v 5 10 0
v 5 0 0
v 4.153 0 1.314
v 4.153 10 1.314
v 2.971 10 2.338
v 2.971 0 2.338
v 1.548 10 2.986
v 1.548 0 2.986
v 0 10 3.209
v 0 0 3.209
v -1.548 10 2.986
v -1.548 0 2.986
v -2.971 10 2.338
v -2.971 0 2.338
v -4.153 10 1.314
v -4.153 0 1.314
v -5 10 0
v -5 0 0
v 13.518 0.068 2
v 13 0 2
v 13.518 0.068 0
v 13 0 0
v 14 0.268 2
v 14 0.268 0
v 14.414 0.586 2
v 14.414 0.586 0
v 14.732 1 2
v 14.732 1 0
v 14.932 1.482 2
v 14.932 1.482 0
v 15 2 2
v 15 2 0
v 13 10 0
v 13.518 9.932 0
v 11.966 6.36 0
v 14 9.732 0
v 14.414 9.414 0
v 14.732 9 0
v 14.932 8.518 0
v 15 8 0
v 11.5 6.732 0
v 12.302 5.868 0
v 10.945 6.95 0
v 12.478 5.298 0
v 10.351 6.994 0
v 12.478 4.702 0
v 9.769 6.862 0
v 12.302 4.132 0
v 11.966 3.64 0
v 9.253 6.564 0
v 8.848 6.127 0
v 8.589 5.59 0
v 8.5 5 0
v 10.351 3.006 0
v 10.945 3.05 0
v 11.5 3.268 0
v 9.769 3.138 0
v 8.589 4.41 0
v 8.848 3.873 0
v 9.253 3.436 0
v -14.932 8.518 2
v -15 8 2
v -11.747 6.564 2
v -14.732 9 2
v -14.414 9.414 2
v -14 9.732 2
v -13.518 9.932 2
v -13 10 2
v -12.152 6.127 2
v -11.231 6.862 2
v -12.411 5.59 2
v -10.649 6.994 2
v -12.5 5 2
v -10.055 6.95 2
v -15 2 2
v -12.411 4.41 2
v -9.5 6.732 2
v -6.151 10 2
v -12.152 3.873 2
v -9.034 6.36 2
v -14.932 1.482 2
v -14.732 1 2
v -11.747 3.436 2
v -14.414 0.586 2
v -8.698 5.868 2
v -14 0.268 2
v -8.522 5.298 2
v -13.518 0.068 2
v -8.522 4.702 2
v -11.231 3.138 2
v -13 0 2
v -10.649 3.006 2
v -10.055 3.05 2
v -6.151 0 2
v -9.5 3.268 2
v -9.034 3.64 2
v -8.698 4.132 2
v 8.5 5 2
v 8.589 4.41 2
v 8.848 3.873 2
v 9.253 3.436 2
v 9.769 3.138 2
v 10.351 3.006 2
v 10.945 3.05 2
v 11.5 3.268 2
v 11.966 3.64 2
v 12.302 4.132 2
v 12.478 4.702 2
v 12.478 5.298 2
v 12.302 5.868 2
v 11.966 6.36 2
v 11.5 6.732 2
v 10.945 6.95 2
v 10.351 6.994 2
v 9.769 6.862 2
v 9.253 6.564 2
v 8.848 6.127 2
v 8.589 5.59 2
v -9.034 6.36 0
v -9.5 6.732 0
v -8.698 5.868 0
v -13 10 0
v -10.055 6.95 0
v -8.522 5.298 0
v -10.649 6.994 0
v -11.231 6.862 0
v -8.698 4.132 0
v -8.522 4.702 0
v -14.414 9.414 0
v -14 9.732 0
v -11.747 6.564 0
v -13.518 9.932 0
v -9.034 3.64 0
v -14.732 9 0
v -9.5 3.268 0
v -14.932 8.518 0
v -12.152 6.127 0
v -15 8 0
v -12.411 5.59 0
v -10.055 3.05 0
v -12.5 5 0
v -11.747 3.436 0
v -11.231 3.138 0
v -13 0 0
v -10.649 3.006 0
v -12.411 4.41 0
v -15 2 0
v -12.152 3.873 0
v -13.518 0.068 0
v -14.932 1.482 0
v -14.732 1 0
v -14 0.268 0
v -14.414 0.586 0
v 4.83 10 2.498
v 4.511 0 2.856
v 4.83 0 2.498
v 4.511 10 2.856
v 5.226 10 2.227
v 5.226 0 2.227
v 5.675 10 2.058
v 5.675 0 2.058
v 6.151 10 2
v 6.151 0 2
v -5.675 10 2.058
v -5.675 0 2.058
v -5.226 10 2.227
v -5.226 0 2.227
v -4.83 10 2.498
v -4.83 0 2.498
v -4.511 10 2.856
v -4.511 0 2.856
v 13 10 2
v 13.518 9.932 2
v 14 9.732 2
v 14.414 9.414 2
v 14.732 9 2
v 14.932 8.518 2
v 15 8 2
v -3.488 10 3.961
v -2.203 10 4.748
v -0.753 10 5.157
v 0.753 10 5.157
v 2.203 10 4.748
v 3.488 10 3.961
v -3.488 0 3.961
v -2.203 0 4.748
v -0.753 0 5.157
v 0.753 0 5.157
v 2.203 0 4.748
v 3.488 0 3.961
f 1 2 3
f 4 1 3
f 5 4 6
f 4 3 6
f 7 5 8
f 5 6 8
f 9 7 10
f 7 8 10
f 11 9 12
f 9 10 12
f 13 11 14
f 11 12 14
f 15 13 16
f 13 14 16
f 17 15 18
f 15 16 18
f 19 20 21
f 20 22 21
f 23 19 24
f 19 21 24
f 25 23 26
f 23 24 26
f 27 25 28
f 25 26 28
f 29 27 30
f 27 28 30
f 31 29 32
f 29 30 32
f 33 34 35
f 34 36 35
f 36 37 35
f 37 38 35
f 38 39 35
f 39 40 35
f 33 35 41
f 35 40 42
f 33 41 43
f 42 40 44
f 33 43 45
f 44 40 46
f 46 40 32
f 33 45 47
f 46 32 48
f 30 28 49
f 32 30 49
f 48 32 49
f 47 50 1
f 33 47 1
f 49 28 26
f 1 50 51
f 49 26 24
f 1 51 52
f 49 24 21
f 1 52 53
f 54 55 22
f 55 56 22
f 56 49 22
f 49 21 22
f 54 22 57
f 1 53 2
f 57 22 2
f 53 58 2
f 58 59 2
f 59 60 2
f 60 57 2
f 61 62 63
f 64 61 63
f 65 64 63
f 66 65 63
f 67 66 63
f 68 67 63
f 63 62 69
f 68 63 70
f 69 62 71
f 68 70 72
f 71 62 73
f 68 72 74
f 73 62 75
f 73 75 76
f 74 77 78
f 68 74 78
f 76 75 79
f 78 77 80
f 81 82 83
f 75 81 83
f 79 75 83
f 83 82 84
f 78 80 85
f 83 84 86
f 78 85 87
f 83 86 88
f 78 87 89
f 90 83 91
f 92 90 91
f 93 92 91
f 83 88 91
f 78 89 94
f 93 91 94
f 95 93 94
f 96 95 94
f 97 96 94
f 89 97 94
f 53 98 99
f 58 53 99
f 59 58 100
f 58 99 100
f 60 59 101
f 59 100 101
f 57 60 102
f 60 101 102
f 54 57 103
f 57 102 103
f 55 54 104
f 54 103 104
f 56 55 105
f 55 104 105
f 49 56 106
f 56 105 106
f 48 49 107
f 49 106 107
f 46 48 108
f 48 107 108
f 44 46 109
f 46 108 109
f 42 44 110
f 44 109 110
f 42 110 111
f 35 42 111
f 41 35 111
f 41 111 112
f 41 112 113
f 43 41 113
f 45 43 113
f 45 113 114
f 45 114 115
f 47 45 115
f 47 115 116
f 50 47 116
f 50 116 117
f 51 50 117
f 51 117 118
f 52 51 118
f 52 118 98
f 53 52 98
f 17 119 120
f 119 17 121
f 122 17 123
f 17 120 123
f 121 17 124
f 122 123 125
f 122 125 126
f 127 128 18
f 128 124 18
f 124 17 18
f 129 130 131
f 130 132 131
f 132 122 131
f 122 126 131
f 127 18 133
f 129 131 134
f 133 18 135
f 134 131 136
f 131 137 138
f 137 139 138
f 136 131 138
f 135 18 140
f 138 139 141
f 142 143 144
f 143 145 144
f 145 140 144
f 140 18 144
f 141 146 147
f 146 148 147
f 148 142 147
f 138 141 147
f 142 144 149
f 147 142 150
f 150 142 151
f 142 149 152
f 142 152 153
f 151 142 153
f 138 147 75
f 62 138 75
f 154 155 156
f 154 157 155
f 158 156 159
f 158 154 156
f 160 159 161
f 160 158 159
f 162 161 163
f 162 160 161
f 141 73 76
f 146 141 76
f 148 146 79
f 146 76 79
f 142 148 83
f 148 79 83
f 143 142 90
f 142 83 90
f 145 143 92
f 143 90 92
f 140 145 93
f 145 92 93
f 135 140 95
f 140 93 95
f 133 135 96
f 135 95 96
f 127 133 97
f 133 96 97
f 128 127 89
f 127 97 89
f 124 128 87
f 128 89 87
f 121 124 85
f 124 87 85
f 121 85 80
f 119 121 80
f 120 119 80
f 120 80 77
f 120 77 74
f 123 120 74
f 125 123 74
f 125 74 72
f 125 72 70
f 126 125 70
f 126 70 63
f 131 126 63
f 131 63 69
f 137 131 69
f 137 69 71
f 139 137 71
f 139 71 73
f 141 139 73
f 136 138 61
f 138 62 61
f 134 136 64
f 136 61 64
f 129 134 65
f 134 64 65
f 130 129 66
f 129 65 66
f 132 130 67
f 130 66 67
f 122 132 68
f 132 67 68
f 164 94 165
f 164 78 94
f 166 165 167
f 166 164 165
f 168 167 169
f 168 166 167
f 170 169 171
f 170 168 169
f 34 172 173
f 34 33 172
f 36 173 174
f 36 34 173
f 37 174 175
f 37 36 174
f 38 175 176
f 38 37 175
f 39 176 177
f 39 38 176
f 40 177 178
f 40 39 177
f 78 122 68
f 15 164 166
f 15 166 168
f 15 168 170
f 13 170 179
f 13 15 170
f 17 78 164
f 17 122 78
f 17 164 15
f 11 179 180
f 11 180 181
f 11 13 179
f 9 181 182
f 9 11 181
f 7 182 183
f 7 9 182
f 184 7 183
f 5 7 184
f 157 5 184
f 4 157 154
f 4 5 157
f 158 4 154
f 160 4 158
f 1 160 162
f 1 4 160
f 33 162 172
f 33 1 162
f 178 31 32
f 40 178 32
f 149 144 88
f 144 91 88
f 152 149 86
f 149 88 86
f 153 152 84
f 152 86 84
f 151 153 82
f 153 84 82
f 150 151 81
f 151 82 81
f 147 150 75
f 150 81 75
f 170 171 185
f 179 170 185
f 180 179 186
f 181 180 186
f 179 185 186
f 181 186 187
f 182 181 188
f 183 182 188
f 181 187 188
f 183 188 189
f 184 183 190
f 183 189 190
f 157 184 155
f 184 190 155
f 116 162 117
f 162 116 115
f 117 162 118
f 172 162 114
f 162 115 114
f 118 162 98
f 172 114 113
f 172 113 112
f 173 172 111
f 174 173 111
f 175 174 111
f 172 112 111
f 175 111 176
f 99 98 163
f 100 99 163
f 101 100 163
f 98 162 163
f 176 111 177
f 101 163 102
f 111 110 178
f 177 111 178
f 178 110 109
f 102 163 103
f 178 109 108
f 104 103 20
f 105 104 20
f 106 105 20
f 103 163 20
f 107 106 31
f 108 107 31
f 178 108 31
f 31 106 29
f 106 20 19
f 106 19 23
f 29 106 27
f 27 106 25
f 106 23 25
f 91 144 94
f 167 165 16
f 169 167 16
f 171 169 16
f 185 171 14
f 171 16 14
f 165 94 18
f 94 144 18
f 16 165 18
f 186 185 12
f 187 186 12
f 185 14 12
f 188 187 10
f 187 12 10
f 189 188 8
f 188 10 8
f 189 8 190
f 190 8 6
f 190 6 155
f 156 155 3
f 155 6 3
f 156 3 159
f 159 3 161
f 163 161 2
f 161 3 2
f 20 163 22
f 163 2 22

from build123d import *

# Parameters (mm, degrees)
BOSS_EXTRUDE1_DEPTH   = 10
FILLET1_R             = 2
FILLET2_R             = 2
F_4_0MM_DOWEL_HOLE1_D = 4


with BuildPart() as part:
    # Sketch1 → Boss-Extrude1 (new body)
    with BuildSketch(Plane(origin=(0, 0, 0), x_dir=(1, 0, 0), z_dir=(0, 1, 0))):
        with BuildLine():
            Line((-15, -2), (-5, -2))
            ThreePointArc((-5, -2), (0, -5.208712153), (5, -2))
            Line((5, -2), (15, -2))
            Line((15, -2), (15, 0))
            Line((15, 0), (5, 0))
            ThreePointArc((5, 0), (0, -3.208712153), (-5, 0))
            Line((-5, 0), (-15, 0))
            Line((-15, 0), (-15, -2))
        make_face()
    extrude(amount=BOSS_EXTRUDE1_DEPTH)

    # Fillet1
    fillet1_edges = [part.edges().sort_by_distance(p)[0] for p in [
        (5, 5, 2),
        (-5, 5, 2),
    ]]
    fillet(fillet1_edges, radius=FILLET1_R)

    # Fillet2
    fillet2_edges = [part.edges().sort_by_distance(p)[0] for p in [
        (15, 0, 1),
        (15, 10, 1),
        (-15, 10, 1),
        (-15, 0, 1),
    ]]
    fillet(fillet2_edges, radius=FILLET2_R)

    # Ø4.0mm Dowel Hole1 (through all)
    with Locations(Plane(origin=(0, 0, 0), x_dir=(1, 0, 0), z_dir=(0, 0, -1))):
        with Locations((10.5, -5), (-10.5, -5)):
            Hole(F_4_0MM_DOWEL_HOLE1_D / 2)


solid = part.part
